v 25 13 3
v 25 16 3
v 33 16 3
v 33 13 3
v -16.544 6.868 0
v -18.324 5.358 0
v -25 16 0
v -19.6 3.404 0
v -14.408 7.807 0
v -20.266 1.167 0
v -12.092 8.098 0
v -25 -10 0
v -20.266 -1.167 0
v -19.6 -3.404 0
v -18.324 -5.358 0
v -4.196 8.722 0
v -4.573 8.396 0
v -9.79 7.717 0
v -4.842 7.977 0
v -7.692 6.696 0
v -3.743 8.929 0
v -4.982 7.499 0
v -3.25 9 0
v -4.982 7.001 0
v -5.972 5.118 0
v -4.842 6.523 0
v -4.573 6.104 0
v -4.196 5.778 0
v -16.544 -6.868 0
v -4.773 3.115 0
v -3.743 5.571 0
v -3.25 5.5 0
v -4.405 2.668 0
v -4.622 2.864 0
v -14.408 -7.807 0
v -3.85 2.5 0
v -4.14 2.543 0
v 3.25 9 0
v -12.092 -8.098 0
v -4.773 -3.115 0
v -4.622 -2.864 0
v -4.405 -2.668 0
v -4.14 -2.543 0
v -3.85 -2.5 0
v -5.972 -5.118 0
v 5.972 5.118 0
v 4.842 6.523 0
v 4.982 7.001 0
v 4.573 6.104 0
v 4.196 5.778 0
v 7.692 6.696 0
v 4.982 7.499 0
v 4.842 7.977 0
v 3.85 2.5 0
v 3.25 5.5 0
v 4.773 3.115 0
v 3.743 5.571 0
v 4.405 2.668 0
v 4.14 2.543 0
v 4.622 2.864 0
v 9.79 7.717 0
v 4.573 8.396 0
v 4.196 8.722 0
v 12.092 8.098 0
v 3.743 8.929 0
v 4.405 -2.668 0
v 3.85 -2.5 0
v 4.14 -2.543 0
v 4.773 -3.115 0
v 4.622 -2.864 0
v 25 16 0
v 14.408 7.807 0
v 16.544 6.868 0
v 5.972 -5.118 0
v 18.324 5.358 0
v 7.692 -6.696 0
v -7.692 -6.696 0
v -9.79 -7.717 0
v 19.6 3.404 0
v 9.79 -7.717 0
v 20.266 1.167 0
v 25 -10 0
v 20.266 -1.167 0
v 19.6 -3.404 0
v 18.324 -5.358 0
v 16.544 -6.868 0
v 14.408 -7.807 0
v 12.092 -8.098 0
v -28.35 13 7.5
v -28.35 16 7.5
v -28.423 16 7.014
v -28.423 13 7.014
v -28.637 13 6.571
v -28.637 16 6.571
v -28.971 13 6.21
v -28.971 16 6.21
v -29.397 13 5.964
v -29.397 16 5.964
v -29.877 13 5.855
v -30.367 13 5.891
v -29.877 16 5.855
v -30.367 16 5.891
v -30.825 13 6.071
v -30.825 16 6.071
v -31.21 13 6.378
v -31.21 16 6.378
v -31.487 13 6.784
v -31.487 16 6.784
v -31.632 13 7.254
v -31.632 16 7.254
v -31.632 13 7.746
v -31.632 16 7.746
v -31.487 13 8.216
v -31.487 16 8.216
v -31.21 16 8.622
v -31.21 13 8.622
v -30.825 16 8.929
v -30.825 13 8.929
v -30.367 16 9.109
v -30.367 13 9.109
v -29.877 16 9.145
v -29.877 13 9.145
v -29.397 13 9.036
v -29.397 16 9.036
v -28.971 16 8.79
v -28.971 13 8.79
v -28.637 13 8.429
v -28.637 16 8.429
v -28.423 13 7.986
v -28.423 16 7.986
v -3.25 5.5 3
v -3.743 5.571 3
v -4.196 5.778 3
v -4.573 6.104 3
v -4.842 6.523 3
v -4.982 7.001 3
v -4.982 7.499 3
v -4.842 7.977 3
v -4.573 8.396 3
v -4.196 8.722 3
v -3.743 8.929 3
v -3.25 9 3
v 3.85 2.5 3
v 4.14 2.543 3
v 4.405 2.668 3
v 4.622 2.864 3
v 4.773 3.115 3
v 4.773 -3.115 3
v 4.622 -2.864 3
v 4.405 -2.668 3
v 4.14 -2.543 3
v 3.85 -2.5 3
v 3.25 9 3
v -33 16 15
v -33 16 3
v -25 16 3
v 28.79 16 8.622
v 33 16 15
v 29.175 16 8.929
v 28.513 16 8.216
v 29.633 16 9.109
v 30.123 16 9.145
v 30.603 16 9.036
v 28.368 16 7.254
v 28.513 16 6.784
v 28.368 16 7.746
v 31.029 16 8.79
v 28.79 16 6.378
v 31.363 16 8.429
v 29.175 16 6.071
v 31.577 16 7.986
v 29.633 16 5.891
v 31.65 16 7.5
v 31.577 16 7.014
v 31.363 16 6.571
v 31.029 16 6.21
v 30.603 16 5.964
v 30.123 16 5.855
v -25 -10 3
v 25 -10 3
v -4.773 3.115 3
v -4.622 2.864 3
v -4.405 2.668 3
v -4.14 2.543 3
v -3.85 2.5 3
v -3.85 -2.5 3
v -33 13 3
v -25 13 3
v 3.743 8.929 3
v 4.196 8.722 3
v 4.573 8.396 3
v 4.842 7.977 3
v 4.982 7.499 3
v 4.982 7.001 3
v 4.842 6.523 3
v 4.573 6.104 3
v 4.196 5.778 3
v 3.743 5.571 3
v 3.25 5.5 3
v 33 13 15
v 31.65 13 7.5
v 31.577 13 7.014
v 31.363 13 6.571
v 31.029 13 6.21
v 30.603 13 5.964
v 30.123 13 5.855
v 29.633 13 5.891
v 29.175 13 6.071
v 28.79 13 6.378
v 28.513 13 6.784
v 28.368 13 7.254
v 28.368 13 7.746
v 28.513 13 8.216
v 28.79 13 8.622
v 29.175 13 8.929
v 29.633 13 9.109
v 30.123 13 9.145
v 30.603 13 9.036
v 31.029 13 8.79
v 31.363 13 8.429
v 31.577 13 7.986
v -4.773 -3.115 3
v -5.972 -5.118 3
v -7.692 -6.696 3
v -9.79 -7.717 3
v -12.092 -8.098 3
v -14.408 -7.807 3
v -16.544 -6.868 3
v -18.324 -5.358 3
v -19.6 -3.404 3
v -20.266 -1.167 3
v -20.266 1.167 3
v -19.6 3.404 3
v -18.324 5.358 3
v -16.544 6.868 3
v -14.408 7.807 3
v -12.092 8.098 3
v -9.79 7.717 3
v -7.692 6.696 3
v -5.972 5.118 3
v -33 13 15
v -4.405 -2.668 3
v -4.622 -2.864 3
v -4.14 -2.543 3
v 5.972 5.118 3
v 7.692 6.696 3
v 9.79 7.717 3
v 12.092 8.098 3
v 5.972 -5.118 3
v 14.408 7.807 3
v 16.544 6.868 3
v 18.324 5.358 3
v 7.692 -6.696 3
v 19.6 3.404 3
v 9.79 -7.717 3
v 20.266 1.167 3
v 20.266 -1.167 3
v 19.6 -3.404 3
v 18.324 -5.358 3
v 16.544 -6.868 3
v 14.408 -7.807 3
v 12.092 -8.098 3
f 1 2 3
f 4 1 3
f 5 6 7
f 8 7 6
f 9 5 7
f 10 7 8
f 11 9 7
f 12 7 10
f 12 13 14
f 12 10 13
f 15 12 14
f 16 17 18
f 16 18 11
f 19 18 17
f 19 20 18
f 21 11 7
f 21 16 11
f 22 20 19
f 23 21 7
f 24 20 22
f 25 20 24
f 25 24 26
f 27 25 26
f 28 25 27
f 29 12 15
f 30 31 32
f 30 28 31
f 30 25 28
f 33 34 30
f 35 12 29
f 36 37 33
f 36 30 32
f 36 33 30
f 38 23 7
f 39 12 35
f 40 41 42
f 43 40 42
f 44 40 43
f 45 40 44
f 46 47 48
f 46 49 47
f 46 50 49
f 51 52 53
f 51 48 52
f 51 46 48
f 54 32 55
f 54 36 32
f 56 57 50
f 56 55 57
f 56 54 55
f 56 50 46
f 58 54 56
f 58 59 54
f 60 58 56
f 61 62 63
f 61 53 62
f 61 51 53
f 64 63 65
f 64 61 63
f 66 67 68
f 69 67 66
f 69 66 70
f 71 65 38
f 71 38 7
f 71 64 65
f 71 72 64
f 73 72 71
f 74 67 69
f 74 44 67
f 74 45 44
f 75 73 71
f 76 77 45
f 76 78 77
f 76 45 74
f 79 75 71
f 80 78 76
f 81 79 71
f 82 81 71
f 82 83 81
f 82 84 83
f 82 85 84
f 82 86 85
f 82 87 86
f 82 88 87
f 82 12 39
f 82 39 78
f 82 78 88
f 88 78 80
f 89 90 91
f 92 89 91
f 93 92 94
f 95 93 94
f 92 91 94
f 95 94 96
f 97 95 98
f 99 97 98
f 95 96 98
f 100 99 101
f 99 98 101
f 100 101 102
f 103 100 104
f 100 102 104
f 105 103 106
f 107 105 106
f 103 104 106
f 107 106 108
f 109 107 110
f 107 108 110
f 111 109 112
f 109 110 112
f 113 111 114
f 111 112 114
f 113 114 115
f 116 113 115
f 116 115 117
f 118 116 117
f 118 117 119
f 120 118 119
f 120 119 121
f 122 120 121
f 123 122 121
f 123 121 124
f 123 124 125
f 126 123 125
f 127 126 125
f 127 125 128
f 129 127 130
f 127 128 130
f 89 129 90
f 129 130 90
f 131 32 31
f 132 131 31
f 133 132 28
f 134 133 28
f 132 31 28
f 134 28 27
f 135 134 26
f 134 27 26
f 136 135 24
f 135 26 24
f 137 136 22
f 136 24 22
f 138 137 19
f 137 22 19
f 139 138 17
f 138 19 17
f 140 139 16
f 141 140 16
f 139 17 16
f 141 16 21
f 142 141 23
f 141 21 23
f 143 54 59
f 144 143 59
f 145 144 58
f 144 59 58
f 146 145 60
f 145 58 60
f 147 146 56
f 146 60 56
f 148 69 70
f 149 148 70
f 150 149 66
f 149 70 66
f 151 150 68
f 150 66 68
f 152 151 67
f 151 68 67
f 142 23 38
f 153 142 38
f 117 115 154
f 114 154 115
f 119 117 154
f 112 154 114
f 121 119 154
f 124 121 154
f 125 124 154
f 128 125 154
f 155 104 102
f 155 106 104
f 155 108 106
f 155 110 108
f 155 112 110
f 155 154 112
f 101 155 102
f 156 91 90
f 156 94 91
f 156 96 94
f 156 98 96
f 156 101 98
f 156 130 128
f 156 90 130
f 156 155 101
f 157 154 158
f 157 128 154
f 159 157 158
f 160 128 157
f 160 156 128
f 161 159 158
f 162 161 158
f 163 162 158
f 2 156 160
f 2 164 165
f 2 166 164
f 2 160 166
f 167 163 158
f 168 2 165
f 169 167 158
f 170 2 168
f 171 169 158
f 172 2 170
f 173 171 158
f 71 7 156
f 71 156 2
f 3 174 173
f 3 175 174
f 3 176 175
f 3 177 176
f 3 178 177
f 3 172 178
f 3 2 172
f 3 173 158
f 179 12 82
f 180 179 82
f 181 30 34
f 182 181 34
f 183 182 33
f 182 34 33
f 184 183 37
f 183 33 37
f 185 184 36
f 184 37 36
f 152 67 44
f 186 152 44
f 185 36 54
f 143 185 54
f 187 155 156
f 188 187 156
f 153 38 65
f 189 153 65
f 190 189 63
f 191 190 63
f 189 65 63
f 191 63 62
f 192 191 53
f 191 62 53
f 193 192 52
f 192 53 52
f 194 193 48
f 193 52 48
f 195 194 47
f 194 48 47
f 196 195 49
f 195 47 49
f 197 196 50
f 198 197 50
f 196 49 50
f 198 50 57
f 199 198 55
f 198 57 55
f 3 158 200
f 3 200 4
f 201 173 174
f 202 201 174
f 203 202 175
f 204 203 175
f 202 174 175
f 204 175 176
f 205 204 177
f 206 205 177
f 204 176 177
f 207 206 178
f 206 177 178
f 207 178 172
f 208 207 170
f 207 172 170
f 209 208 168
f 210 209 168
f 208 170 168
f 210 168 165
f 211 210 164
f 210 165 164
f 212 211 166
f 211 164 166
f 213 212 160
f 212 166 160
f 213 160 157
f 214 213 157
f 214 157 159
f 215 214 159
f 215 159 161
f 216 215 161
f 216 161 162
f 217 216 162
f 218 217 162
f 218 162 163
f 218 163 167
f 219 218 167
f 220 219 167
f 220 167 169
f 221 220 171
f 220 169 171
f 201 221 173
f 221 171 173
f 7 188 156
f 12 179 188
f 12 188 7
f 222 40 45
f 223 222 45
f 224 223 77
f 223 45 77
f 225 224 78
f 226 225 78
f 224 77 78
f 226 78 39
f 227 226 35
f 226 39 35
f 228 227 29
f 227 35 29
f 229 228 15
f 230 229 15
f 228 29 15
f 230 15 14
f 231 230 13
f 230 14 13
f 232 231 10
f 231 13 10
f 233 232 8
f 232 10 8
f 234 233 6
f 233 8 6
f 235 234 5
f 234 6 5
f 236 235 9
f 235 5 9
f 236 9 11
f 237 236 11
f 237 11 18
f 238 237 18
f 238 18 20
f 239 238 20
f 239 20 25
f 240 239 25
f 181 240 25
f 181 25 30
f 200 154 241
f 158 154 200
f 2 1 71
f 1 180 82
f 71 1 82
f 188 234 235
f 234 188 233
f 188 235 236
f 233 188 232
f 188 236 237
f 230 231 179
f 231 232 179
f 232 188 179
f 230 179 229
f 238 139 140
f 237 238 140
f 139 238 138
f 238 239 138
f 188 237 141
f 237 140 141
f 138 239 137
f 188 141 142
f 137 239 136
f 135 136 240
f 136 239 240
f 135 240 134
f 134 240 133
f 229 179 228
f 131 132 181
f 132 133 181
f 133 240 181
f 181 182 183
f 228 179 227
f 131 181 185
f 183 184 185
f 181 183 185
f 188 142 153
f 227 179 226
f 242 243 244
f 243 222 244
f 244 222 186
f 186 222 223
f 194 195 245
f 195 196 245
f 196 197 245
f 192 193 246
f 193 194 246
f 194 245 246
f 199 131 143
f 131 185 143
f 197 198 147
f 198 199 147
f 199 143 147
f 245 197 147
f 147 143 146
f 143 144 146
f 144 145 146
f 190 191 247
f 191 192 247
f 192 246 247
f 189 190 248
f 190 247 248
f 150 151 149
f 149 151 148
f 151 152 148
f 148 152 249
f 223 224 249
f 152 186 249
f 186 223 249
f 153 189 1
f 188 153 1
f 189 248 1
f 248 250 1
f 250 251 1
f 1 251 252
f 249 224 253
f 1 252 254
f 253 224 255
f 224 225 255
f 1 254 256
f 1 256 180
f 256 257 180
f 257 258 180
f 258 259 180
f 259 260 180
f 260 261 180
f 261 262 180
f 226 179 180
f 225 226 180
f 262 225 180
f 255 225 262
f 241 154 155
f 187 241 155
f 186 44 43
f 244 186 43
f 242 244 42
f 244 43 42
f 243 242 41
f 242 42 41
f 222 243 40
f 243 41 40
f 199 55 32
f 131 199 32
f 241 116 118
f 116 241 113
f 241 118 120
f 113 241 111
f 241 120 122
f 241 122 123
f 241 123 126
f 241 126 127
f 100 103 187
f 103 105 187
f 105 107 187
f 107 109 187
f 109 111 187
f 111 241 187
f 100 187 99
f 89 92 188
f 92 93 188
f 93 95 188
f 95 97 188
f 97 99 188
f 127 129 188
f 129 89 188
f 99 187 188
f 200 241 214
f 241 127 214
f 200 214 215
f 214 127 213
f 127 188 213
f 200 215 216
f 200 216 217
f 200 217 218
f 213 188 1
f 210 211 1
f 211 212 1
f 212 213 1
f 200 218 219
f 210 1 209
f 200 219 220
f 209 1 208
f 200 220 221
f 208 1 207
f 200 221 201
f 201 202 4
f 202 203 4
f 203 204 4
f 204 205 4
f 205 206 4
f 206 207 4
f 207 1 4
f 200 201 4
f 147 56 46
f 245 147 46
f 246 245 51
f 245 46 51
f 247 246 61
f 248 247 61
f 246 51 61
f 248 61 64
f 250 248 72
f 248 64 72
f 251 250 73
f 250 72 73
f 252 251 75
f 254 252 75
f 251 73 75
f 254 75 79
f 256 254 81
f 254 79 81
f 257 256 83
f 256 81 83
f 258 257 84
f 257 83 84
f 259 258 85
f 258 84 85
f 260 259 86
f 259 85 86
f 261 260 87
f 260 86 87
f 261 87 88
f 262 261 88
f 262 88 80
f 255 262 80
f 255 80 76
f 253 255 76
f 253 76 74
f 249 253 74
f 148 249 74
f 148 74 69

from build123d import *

# Parameters (mm, degrees)
SKETCH_1_W          = 50
SKETCH_1_H          = 20
EXTRUDE_1_DEPTH     = 3
SKETCH_2_W          = 50
SKETCH_2_H          = 15
EXTRUDE_2_DEPTH     = 6
SKETCH_5_W          = 50
SKETCH_5_H          = 12
CUT_EXTRUDE_2_DEPTH = 3
SKETCH_6_W          = 8
SKETCH_6_H          = 12
SKETCH_6_R          = 1.65
EXTRUDE_3_DEPTH     = 3


with BuildPart() as part:
    # 草图1 → 凸台-拉伸1 (new body)
    with BuildSketch(Plane.XY):
        Rectangle(SKETCH_1_W, SKETCH_1_H)
        with BuildLine():
            Line((-3.85, 2.5), (3.85, 2.5))
            ThreePointArc((3.85, 2.5), (4.404700196, 2.667949706), (4.773076923, 3.115384615))
            ThreePointArc((4.773076923, 3.115384615), (20.35, 0), (4.773076923, -3.115384615))
            ThreePointArc((4.773076923, -3.115384615), (4.404700196, -2.667949706), (3.85, -2.5))
            Line((3.85, -2.5), (-3.85, -2.5))
            ThreePointArc((-3.85, -2.5), (-4.404700196, -2.667949706), (-4.773076923, -3.115384615))
            ThreePointArc((-4.773076923, -3.115384615), (-20.35, 0), (-4.773076923, 3.115384615))
            ThreePointArc((-4.773076923, 3.115384615), (-4.404700196, 2.667949706), (-3.85, 2.5))
        make_face(mode=Mode.SUBTRACT)
        with BuildLine():
            Line((3.25, 5.5), (-3.25, 5.5))
            ThreePointArc((-3.25, 5.5), (-5, 7.25), (-3.25, 9))
            Line((-3.25, 9), (3.25, 9))
            ThreePointArc((3.25, 9), (5, 7.25), (3.25, 5.5))
        make_face(mode=Mode.SUBTRACT)
    extrude(amount=EXTRUDE_1_DEPTH)

    # 草图2 → 凸台-拉伸2 (add)
    with BuildSketch(Plane(origin=(0, 10, 0), x_dir=(1, 0, 0), z_dir=(0, 1, 0))):
        with Locations((0, -7.5)):
            Rectangle(SKETCH_2_W, SKETCH_2_H)
    extrude(amount=EXTRUDE_2_DEPTH)

    # 草图5 → 切除-拉伸2 (cut)
    with BuildSketch(Plane.XZ.offset(-10)):
        with Locations((0, 9)):
            Rectangle(SKETCH_5_W, SKETCH_5_H)
    extrude(amount=-CUT_EXTRUDE_2_DEPTH, mode=Mode.SUBTRACT)

    # 草图6 → 凸台-拉伸3 (add)
    with BuildSketch(Plane(origin=(0, 16, 0), x_dir=(1, 0, 0), z_dir=(0, 1, 0))):
        with Locations((29, -9)):
            Rectangle(SKETCH_6_W, SKETCH_6_H)
        with Locations((30, -7.5)):
            Circle(SKETCH_6_R, mode=Mode.SUBTRACT)
        with Locations((-29, -9)):
            Rectangle(SKETCH_6_W, SKETCH_6_H)
        with Locations((-30, -7.5)):
            Circle(SKETCH_6_R, mode=Mode.SUBTRACT)
    extrude(amount=-EXTRUDE_3_DEPTH)


solid = part.part
